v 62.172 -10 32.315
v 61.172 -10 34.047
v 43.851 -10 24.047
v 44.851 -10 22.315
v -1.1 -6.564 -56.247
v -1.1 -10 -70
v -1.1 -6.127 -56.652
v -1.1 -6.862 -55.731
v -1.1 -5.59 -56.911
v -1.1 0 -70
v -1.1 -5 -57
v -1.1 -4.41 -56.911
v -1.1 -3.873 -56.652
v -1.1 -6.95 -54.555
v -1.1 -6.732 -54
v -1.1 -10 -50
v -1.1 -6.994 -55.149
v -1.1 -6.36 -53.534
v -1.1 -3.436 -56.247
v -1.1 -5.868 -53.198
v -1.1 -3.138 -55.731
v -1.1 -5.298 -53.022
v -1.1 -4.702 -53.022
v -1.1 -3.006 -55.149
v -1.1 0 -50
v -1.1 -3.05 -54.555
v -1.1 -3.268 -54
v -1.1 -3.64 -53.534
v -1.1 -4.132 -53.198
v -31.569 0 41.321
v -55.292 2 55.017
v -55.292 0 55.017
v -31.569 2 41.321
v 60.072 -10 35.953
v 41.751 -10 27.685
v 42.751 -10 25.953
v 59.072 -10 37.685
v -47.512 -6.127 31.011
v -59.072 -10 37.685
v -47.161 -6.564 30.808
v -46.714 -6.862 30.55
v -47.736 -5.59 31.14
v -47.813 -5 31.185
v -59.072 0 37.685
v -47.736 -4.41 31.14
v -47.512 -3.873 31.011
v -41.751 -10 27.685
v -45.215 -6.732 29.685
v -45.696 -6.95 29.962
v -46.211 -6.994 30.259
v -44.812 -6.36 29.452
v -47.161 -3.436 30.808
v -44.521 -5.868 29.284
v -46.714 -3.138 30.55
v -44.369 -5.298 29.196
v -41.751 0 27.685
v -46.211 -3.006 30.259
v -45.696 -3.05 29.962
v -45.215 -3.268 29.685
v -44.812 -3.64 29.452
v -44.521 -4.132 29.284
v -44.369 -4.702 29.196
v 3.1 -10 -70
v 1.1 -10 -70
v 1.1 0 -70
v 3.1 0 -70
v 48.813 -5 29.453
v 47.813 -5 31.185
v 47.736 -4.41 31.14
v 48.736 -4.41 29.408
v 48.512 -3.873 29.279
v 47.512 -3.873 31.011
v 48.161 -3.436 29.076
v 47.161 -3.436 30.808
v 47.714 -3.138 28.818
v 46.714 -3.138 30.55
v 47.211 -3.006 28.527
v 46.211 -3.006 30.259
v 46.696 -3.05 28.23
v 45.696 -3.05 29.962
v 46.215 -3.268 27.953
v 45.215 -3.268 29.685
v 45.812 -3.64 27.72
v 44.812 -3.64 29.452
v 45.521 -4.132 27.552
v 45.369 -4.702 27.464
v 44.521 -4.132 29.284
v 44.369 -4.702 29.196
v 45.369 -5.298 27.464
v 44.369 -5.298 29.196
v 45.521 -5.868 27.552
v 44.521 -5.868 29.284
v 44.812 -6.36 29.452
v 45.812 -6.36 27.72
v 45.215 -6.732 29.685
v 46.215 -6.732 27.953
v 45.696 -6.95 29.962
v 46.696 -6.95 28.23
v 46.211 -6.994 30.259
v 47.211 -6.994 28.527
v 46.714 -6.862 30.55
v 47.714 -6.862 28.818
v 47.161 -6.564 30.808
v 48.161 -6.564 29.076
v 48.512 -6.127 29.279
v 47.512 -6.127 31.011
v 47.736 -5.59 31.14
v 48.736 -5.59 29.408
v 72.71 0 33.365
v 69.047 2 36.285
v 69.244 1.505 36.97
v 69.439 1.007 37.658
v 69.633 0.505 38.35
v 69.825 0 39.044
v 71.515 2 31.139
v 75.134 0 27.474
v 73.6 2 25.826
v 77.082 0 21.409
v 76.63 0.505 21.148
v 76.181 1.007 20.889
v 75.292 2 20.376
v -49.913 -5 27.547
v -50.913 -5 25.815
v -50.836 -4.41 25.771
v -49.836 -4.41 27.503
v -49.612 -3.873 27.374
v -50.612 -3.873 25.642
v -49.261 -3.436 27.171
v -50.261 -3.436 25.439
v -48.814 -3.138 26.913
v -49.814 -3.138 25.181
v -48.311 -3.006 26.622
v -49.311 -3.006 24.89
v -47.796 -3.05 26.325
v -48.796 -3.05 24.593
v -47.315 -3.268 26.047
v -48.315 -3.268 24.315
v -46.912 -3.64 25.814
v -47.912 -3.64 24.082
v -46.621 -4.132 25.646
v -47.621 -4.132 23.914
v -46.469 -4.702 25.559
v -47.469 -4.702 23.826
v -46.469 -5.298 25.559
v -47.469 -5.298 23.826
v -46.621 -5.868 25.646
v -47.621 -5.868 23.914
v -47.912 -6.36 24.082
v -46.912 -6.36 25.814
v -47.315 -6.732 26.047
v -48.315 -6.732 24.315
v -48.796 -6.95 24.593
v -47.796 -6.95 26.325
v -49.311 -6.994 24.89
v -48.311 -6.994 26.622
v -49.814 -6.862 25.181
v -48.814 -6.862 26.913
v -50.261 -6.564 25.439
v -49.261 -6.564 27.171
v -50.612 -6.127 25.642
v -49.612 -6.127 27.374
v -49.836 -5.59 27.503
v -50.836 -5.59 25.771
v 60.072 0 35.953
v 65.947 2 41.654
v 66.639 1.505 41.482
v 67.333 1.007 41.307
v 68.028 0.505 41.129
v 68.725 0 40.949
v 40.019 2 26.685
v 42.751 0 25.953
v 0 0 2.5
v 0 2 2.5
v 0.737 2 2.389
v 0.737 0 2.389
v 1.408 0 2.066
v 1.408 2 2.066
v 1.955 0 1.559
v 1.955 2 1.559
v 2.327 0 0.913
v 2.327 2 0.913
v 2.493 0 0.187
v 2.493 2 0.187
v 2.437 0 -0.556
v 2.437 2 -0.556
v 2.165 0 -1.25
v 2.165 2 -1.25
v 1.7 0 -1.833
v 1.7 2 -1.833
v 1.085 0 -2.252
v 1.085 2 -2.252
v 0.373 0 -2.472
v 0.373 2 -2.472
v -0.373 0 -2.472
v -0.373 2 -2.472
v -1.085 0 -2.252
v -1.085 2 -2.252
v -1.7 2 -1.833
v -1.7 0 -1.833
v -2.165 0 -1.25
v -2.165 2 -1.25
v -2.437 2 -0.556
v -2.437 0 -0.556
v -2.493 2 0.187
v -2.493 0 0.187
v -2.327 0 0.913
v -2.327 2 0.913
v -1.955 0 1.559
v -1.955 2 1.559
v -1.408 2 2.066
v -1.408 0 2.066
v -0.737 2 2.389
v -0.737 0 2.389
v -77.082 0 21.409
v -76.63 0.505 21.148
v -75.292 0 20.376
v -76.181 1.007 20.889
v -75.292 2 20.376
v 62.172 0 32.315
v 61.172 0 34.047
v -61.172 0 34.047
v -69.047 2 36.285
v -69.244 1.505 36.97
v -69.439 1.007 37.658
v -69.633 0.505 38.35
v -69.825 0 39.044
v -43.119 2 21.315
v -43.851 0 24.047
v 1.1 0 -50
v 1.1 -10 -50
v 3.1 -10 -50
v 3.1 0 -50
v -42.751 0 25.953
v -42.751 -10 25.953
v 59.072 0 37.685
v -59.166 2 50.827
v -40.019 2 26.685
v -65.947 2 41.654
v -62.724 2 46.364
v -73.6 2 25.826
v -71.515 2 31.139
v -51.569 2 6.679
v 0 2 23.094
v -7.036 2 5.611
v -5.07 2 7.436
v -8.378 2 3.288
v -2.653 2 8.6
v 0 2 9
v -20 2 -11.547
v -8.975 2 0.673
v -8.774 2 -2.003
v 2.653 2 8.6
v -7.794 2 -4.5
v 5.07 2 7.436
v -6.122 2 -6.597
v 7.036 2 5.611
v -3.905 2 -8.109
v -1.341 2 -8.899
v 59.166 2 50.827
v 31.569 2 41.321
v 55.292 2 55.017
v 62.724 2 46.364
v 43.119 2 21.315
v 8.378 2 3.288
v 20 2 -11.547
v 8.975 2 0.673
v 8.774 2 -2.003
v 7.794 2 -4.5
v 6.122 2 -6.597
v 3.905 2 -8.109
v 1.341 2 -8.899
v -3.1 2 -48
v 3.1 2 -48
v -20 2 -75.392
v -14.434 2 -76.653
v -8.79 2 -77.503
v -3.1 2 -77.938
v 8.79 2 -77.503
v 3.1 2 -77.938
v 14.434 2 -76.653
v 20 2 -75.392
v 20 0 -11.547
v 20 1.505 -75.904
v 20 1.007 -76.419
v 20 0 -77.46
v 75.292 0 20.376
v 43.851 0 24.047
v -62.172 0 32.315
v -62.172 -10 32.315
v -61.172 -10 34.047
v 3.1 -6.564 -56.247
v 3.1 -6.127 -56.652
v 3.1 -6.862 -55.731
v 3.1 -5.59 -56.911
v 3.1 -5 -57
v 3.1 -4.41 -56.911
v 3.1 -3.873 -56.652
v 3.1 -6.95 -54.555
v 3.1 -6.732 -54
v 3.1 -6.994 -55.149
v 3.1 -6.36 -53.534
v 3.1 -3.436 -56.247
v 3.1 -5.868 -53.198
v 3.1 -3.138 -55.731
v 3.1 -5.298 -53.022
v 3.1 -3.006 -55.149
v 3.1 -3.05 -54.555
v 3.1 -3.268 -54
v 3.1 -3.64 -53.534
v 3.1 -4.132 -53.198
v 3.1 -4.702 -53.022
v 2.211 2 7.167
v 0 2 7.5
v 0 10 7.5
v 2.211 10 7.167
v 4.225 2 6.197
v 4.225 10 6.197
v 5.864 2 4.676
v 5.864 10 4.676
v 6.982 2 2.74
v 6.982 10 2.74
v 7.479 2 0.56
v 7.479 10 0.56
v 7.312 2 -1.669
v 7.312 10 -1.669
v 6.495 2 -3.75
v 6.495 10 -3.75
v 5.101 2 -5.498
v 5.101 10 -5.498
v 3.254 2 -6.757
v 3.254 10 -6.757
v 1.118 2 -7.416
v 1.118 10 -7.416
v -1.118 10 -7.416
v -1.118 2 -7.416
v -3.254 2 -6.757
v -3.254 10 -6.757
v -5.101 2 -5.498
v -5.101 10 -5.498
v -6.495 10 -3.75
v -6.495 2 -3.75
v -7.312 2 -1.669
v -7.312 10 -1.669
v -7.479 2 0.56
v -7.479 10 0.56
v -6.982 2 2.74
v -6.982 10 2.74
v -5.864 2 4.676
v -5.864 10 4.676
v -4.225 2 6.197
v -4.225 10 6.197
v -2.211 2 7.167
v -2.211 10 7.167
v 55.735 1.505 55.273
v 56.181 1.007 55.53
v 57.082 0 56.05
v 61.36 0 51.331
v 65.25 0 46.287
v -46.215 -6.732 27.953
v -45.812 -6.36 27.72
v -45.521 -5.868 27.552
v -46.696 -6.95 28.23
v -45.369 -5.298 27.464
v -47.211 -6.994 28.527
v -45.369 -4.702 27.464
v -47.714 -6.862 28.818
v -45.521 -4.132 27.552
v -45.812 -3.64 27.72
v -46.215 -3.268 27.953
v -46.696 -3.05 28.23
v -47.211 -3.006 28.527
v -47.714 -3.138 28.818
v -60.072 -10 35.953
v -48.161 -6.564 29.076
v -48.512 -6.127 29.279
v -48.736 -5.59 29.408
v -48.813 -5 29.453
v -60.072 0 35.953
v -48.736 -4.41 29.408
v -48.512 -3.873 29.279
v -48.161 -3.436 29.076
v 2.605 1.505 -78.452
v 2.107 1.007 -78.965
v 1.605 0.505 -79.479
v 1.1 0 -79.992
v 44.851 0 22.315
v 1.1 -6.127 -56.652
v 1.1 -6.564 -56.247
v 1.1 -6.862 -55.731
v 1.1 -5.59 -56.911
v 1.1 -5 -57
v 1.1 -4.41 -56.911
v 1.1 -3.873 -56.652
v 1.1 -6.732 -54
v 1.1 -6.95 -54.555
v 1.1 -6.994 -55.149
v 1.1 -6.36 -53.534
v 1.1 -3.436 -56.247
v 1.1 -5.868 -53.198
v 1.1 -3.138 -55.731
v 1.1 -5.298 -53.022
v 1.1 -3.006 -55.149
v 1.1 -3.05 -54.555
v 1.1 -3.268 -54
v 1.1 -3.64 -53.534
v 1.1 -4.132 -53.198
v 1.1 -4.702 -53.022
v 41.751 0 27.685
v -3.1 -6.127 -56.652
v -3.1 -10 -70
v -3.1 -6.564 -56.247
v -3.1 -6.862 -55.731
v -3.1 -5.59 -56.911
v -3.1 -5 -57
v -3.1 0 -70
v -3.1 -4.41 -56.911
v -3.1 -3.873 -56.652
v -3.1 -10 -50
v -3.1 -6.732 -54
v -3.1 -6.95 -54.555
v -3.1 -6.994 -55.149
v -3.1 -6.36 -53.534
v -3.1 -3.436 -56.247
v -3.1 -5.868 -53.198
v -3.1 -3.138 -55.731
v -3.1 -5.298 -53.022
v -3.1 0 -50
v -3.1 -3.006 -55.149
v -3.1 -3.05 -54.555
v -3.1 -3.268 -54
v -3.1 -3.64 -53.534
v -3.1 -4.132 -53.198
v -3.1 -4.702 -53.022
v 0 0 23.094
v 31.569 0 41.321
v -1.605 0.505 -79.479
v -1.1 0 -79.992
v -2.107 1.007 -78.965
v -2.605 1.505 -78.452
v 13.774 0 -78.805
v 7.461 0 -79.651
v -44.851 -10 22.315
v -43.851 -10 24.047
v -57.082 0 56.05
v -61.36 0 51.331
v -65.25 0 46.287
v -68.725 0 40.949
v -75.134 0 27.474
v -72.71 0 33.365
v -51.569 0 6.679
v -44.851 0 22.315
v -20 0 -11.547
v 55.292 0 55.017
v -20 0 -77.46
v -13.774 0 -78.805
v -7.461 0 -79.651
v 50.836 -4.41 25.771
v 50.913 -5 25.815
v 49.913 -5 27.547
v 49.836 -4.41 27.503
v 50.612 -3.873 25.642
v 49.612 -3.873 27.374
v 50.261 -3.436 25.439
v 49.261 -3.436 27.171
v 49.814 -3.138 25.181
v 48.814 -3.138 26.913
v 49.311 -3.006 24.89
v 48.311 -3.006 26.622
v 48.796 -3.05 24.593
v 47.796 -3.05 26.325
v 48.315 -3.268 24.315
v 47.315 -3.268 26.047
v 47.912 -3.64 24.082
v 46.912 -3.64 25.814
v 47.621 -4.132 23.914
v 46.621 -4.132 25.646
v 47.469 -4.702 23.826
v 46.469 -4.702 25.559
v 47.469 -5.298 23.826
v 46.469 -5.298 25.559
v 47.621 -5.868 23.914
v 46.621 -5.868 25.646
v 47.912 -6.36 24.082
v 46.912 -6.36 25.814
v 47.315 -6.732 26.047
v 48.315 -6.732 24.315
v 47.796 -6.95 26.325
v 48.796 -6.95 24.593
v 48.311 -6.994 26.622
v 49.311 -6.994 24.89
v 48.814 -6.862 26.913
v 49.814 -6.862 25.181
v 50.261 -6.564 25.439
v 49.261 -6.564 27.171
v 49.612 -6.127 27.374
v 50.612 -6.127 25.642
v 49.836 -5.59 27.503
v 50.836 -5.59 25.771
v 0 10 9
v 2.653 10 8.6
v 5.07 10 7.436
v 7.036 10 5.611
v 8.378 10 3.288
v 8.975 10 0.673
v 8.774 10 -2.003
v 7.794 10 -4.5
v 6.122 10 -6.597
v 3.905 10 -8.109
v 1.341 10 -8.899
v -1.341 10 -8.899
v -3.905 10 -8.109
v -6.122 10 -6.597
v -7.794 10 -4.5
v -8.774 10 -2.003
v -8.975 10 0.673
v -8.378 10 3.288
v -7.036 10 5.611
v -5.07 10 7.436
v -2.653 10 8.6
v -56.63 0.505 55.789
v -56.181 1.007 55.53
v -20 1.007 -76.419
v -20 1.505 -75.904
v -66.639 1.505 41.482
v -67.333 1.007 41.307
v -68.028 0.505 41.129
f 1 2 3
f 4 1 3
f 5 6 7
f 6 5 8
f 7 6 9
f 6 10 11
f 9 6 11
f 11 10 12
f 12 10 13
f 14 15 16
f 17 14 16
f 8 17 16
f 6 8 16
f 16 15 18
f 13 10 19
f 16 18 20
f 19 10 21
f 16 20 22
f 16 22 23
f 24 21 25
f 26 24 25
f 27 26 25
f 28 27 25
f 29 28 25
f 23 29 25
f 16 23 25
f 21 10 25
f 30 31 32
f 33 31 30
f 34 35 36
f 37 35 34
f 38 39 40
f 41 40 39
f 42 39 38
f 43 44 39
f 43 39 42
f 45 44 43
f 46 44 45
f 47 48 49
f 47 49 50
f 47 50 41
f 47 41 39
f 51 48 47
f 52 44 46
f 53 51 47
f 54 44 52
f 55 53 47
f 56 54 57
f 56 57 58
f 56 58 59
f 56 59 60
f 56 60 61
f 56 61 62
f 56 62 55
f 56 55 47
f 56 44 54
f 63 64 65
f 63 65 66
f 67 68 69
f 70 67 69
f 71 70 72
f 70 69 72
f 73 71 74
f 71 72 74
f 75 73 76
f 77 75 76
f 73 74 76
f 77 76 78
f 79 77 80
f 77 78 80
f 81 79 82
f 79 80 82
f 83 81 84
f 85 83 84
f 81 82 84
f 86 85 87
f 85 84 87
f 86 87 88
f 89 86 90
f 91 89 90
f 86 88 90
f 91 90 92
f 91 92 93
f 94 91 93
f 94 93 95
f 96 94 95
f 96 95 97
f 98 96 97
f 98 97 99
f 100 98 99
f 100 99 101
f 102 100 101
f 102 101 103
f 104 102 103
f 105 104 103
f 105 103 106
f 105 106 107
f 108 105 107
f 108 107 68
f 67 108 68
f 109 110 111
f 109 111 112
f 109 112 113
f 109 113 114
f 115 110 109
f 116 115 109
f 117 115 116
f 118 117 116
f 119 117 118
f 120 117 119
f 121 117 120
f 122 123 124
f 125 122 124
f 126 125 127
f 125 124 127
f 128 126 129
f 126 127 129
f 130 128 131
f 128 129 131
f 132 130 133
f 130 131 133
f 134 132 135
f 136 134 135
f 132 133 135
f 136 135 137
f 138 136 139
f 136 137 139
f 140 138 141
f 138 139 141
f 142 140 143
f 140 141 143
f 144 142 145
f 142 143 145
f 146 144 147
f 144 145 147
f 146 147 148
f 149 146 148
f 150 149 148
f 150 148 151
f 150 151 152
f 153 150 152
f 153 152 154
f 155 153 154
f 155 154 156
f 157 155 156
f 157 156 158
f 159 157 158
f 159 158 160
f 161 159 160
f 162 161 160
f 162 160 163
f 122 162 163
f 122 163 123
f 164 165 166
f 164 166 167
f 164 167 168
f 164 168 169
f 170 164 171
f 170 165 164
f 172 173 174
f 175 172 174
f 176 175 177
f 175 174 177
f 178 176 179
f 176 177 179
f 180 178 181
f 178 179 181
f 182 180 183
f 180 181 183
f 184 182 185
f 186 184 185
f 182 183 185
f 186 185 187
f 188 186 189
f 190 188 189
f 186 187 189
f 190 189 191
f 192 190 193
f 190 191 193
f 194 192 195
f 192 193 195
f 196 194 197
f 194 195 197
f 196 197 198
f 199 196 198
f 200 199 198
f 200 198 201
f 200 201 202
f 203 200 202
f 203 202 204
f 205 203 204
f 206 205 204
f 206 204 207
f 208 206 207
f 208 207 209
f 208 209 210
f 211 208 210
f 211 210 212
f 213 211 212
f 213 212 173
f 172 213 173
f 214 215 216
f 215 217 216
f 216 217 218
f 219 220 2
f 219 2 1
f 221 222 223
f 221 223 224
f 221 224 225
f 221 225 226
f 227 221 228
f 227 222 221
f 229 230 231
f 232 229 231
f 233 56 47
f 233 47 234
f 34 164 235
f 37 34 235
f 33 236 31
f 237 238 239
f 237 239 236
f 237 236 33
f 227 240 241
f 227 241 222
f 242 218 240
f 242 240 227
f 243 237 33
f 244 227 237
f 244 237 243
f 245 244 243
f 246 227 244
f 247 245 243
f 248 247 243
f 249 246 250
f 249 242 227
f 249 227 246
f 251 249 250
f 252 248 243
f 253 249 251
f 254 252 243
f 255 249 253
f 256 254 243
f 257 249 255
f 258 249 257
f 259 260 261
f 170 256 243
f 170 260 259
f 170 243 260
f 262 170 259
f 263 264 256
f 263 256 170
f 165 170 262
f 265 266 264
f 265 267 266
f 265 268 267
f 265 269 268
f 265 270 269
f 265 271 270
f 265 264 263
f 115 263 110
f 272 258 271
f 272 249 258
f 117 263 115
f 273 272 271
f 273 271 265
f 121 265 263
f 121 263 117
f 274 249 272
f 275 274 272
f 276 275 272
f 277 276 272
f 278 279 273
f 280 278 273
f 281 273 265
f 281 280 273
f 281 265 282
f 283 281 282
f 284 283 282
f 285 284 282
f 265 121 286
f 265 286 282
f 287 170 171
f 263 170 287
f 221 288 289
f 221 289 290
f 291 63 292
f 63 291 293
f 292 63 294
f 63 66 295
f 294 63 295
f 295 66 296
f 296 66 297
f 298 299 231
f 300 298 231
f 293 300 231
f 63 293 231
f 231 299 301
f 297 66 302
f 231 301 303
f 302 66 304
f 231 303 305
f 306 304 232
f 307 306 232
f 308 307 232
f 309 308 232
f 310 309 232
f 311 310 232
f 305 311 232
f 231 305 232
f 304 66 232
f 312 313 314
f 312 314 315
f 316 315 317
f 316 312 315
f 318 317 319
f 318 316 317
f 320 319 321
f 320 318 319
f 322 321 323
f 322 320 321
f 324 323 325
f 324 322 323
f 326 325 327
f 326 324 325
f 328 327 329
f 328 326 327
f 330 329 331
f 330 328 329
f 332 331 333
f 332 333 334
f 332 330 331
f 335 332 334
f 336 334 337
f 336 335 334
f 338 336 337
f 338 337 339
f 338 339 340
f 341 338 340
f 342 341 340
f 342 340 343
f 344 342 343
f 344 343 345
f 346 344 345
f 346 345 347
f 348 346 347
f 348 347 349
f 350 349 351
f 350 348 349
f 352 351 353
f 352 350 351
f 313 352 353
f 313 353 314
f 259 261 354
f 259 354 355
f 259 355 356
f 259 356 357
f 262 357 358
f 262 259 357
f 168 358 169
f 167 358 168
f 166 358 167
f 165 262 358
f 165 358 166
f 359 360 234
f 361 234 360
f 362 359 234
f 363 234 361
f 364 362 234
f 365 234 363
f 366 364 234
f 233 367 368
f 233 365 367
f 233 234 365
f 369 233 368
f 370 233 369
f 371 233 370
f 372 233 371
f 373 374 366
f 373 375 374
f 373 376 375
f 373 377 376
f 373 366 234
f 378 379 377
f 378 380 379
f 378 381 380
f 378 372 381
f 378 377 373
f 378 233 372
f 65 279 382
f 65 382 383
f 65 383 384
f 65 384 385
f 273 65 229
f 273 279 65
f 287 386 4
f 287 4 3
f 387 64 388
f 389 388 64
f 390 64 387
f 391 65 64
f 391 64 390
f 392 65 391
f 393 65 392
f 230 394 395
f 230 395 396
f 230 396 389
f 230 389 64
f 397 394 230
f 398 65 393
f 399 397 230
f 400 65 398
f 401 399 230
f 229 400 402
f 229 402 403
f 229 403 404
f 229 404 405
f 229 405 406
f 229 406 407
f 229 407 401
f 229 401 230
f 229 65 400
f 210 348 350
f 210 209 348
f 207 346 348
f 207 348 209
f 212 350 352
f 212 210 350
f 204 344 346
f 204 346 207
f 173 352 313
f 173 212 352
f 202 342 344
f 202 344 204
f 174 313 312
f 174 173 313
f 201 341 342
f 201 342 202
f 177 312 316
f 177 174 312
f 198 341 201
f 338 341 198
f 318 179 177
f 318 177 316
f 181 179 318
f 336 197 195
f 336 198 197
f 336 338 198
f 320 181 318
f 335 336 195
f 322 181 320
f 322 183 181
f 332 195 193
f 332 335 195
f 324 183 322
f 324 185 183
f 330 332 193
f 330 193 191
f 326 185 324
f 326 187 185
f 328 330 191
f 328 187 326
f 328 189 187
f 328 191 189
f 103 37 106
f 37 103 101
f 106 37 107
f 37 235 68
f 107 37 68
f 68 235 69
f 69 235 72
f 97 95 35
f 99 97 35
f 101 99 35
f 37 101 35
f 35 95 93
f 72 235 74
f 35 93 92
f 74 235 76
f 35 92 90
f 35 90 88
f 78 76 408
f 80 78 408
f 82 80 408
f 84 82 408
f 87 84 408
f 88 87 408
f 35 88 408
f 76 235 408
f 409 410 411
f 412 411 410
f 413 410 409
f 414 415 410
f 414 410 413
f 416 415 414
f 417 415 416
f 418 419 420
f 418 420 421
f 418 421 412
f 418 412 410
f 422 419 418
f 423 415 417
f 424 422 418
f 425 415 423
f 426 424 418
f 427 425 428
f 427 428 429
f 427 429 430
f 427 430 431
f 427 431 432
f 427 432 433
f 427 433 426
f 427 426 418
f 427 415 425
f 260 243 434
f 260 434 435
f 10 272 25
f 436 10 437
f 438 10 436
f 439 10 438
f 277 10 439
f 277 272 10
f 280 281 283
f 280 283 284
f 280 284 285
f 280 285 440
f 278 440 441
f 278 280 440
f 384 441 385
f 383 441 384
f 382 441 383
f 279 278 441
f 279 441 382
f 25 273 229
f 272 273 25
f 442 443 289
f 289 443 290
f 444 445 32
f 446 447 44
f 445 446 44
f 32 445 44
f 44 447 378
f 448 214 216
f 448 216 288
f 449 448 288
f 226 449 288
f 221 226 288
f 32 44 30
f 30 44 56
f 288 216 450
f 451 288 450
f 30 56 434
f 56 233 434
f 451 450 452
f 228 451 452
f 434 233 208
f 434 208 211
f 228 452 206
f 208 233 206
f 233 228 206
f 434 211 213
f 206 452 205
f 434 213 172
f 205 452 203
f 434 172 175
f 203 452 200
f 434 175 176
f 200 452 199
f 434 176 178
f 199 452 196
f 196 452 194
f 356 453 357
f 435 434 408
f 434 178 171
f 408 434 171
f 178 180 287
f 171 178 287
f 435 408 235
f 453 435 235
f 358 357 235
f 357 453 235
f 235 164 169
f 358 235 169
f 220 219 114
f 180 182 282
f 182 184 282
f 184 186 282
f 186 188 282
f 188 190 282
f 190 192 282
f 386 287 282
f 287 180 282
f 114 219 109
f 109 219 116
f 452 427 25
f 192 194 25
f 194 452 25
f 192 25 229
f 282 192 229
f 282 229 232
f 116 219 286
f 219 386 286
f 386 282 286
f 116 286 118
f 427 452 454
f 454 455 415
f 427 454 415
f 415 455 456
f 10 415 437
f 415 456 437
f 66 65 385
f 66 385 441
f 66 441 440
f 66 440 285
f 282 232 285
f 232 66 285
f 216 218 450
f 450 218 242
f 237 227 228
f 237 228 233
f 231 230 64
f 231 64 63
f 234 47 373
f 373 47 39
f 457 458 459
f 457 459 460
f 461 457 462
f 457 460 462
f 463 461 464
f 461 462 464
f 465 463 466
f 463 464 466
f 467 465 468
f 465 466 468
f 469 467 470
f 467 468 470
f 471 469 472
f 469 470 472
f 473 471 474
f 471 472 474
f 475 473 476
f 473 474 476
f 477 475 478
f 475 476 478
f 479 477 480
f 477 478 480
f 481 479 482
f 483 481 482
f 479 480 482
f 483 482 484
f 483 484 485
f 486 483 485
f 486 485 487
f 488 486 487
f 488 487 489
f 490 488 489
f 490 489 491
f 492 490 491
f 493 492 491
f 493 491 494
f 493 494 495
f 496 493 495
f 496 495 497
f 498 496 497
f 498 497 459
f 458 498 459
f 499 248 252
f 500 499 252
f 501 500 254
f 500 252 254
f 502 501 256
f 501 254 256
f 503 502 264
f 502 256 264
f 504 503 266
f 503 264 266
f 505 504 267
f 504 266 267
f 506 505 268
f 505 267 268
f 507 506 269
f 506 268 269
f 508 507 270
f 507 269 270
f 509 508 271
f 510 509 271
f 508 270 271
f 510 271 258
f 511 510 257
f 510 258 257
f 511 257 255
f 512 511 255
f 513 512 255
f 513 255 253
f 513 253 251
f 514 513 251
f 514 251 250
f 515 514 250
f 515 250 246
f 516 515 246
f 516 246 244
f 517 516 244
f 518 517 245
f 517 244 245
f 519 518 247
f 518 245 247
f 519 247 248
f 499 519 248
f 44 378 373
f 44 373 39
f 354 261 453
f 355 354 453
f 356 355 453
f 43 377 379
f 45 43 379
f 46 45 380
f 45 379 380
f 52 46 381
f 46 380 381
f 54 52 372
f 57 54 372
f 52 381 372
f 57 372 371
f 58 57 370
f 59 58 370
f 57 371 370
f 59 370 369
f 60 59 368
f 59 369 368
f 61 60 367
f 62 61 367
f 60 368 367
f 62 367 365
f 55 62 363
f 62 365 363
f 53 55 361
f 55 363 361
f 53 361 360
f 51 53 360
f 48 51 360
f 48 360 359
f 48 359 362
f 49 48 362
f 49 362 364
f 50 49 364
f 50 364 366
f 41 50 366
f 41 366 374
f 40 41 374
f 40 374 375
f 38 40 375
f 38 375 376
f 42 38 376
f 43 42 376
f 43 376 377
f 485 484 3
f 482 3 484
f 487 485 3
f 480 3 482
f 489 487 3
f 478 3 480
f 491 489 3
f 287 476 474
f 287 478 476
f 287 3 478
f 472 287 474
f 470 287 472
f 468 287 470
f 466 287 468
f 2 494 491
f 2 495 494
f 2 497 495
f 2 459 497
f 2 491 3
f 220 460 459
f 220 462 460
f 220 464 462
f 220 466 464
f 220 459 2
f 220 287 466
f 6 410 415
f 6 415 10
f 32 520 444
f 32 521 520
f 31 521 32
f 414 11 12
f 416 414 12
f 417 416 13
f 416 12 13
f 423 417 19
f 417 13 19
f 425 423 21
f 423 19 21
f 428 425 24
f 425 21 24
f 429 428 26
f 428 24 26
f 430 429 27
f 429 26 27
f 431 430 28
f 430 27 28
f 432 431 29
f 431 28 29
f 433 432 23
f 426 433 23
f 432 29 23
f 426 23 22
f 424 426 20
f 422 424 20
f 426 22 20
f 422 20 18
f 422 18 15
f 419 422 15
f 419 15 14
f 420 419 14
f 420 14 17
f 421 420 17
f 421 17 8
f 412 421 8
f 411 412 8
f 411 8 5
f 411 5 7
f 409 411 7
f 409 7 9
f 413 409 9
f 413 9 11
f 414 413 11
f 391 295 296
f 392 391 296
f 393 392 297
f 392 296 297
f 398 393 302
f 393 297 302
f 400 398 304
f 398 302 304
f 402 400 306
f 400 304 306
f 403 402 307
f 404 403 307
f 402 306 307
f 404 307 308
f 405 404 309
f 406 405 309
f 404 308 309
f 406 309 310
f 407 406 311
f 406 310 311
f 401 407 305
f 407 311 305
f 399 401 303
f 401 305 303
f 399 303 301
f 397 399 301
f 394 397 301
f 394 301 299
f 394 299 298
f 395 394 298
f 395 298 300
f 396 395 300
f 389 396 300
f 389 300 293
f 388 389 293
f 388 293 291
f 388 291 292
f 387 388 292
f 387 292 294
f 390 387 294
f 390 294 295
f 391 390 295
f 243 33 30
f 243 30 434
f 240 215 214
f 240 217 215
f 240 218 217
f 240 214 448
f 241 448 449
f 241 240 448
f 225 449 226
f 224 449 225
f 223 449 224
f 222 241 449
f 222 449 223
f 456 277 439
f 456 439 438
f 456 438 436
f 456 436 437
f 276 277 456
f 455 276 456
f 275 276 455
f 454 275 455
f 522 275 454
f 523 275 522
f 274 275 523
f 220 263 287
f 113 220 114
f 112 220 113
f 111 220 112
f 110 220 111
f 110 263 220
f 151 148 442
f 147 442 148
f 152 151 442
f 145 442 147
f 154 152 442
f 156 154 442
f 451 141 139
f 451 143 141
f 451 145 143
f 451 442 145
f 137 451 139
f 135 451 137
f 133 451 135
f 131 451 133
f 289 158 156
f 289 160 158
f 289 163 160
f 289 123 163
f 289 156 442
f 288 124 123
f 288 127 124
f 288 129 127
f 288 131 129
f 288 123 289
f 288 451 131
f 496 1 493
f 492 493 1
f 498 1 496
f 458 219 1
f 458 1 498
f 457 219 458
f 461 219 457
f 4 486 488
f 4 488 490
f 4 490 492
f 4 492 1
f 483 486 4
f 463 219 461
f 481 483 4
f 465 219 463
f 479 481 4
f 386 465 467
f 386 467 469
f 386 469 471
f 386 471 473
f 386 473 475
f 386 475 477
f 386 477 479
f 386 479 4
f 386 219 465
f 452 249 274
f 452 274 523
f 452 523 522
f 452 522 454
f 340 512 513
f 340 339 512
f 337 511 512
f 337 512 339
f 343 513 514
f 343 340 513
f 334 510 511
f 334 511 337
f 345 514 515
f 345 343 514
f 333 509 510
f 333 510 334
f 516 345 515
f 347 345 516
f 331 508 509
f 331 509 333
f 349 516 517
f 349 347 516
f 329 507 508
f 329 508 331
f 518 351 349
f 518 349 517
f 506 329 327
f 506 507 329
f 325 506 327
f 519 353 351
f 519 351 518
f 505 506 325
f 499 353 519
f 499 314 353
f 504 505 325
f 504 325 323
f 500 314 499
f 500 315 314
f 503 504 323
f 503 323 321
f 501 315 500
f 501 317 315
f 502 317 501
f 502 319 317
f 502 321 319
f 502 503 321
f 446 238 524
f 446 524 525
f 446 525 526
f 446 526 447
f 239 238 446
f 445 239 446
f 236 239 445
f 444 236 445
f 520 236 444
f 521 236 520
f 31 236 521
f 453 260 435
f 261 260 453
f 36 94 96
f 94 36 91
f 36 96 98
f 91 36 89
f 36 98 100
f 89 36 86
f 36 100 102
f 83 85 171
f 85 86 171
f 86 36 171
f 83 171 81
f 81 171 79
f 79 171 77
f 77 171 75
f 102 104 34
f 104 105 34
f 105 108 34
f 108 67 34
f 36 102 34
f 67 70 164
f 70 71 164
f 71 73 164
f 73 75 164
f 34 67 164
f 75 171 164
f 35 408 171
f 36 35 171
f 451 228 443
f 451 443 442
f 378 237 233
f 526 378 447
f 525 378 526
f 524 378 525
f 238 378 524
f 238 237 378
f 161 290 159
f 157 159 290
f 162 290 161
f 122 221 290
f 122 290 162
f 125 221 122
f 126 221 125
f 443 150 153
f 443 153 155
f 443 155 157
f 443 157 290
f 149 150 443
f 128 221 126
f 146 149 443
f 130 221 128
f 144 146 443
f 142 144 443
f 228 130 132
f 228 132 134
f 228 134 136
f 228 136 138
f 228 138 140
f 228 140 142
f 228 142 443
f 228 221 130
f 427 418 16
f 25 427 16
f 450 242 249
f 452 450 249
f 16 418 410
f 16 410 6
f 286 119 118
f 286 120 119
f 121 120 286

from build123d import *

# Parameters (mm, degrees)
BOSS_EXTRUDE1_DEPTH = 2
BOSS_EXTRUDE1_DRAFT = 45
SKETCH2_R           = 2.5
CUT_EXTRUDE1_DEPTH  = 114.154761278
SKETCH3_R           = 9
SKETCH3_R_2         = 7.5
BOSS_EXTRUDE2_DEPTH = 8
SKETCH4_W           = 2
SKETCH4_H           = 20
BOSS_EXTRUDE3_DEPTH = 10
SKETCH5_R           = 2
CUT_EXTRUDE2_DEPTH  = 10
CIRPATTERN1_COUNT   = 3
CUT_EXTRUDE3_DEPTH  = 1000


# Read off the part's stored shape, not the designer's step: Boss-Extrude1
with BuildPart() as part:
    # Boss-Extrude1 outline → Boss-Extrude1 (with draft: the straight prism first)
    with BuildSketch(Plane(origin=(0, 2, 0), x_dir=(1, 0, 0), z_dir=(0, 1, 0))):
        with BuildLine():
            ThreePointArc((-3.1, 77.938373091), (-67.549981495, 39), (-69.046611026, -36.284507794))
            Line((-69.046611026, -36.284507794), (-43.119219382, -21.315321248))
            Line((-43.119219382, -21.315321248), (-40.019219382, -26.684678752))
            Line((-40.019219382, -26.684678752), (-65.946611026, -41.653865297))
            ThreePointArc((-65.946611026, -41.653865297), (0, -78), (65.946611026, -41.653865297))
            Line((65.946611026, -41.653865297), (40.019219382, -26.684678752))
            Line((40.019219382, -26.684678752), (43.119219382, -21.315321248))
            Line((43.119219382, -21.315321248), (69.046611026, -36.284507794))
            ThreePointArc((69.046611026, -36.284507794), (67.549981495, 39), (3.1, 77.938373091))
            Line((3.1, 77.938373091), (3.1, 48))
            Line((3.1, 48), (-3.1, 48))
            Line((-3.1, 48), (-3.1, 77.938373091))
        make_face()
    extrude(amount=-BOSS_EXTRUDE1_DEPTH)
    # Boss-Extrude1: the draft: its side faces are tilted about the plane it starts from
    boss_extrude1_sides = [part.faces().sort_by_distance(p)[0] for p in [
        (67.549981495, 1, -39),
        (3.1, 1, -62.969186546),
        (0, 1, -48),
        (-3.1, 1, -62.969186546),
        (-67.549981495, 1, -39),
        (-56.082915204, 1, 28.799914521),
        (-41.569219382, 1, 24),
        (-52.982915204, 1, 34.169272025),
        (0, 1, 78),
        (52.982915204, 1, 34.169272025),
        (41.569219382, 1, 24),
        (56.082915204, 1, 28.799914521),
    ]]
    draft(boss_extrude1_sides, Plane(origin=(0, 2, 0), x_dir=(1, 0, 0), z_dir=(0, 1, 0)), BOSS_EXTRUDE1_DRAFT)

    # Sketch2 → Cut-Extrude1 (cut, through all)
    with BuildSketch(Plane(origin=(0, 2, 0), x_dir=(1, 0, 0), z_dir=(0, 1, 0))):
        with Locations(Location((0, 0, 0), (0, 0, 270))):
            Circle(SKETCH2_R)
    extrude(amount=-CUT_EXTRUDE1_DEPTH, mode=Mode.SUBTRACT)

    # Sketch3 → Boss-Extrude2 (add)
    with BuildSketch(Plane(origin=(0, 2, 0), x_dir=(1, 0, 0), z_dir=(0, 1, 0))):
        with Locations(Location((0, 0, 0), (0, 0, 270))):
            Circle(SKETCH3_R)
        with Locations(Location((0, 0, 0), (0, 0, 270))):
            Circle(SKETCH3_R_2, mode=Mode.SUBTRACT)
    extrude(amount=BOSS_EXTRUDE2_DEPTH)

    # Sketch4 → Boss-Extrude3 (add)
    with BuildSketch(Plane.XZ):
        Polygon((42.751270189, 25.952627944), (60.071778265, 35.952627944), (59.071778265, 37.684678752), (41.751270189, 27.684678752), align=None)
        Polygon((43.851270189, 24.047372056), (61.171778265, 34.047372056), (62.171778265, 32.315321248), (44.851270189, 22.315321248), align=None)
        with Locations((2.1, -60)):
            Rectangle(SKETCH4_W, SKETCH4_H)
        with Locations((-2.1, -60)):
            Rectangle(SKETCH4_W, SKETCH4_H)
        Polygon((-44.851270189, 22.315321248), (-62.171778265, 32.315321248), (-61.171778265, 34.047372056), (-43.851270189, 24.047372056), align=None)
        Polygon((-42.751270189, 25.952627944), (-60.071778265, 35.952627944), (-59.071778265, 37.684678752), (-41.751270189, 27.684678752), align=None)
    extrude(amount=BOSS_EXTRUDE3_DEPTH)

    # Sketch5 → Cut-Extrude2 (cut)
    with BuildSketch(Plane(origin=(3.1, 0, 0), x_dir=(0, 0, -1), z_dir=(1, 0, 0))):
        with Locations((55, -5)):
            Circle(SKETCH5_R)
    cut_extrude2 = extrude(amount=-CUT_EXTRUDE2_DEPTH, mode=Mode.SUBTRACT)

    # CirPattern1: Cut-Extrude2 ×3 about axis
    cirpattern1_axis = Axis((0, 10, 0), (0, -1, 0))
    for i in range(1, CIRPATTERN1_COUNT):
        add(cut_extrude2.rotate(cirpattern1_axis, i * 360 / CIRPATTERN1_COUNT), mode=Mode.SUBTRACT)

    # Sketch6 → Cut-Extrude3 (cut)
    with BuildSketch(Plane(origin=(0, 2, 0), x_dir=(1, 0, 0), z_dir=(0, 1, 0))):
        with BuildLine():
            Line((20, 75.3923073), (20, 77.459666924))
            ThreePointArc((20, 77.459666924), (69.282032303, 40), (77.082039325, -21.409325386))
            Line((77.082039325, -21.409325386), (75.291653372, -20.375645574))
            Line((75.291653372, -20.375645574), (20, 11.547005384))
            Line((20, 11.547005384), (20, 75.3923073))
        make_face()
        with BuildLine():
            Line((-31.569219382, -41.320508076), (0, -23.094010768))
            Line((0, -23.094010768), (31.569219382, -41.320508076))
            Line((31.569219382, -41.320508076), (55.291653372, -55.016661726))
            Line((55.291653372, -55.016661726), (57.082039325, -56.050341538))
            ThreePointArc((57.082039325, -56.050341538), (0, -80), (-57.082039325, -56.050341538))
            Line((-57.082039325, -56.050341538), (-55.291653372, -55.016661726))
            Line((-55.291653372, -55.016661726), (-31.569219382, -41.320508076))
        make_face()
        with BuildLine():
            Line((-51.569219382, -6.679491924), (-20, 11.547005384))
            Line((-20, 11.547005384), (-20, 75.3923073))
            Line((-20, 75.3923073), (-20, 77.459666924))
            ThreePointArc((-20, 77.459666924), (-69.282032303, 40), (-77.082039325, -21.409325386))
            Line((-77.082039325, -21.409325386), (-75.291653372, -20.375645574))
            Line((-75.291653372, -20.375645574), (-51.569219382, -6.679491924))
        make_face()
    extrude(amount=-CUT_EXTRUDE3_DEPTH, mode=Mode.SUBTRACT)


solid = part.part
